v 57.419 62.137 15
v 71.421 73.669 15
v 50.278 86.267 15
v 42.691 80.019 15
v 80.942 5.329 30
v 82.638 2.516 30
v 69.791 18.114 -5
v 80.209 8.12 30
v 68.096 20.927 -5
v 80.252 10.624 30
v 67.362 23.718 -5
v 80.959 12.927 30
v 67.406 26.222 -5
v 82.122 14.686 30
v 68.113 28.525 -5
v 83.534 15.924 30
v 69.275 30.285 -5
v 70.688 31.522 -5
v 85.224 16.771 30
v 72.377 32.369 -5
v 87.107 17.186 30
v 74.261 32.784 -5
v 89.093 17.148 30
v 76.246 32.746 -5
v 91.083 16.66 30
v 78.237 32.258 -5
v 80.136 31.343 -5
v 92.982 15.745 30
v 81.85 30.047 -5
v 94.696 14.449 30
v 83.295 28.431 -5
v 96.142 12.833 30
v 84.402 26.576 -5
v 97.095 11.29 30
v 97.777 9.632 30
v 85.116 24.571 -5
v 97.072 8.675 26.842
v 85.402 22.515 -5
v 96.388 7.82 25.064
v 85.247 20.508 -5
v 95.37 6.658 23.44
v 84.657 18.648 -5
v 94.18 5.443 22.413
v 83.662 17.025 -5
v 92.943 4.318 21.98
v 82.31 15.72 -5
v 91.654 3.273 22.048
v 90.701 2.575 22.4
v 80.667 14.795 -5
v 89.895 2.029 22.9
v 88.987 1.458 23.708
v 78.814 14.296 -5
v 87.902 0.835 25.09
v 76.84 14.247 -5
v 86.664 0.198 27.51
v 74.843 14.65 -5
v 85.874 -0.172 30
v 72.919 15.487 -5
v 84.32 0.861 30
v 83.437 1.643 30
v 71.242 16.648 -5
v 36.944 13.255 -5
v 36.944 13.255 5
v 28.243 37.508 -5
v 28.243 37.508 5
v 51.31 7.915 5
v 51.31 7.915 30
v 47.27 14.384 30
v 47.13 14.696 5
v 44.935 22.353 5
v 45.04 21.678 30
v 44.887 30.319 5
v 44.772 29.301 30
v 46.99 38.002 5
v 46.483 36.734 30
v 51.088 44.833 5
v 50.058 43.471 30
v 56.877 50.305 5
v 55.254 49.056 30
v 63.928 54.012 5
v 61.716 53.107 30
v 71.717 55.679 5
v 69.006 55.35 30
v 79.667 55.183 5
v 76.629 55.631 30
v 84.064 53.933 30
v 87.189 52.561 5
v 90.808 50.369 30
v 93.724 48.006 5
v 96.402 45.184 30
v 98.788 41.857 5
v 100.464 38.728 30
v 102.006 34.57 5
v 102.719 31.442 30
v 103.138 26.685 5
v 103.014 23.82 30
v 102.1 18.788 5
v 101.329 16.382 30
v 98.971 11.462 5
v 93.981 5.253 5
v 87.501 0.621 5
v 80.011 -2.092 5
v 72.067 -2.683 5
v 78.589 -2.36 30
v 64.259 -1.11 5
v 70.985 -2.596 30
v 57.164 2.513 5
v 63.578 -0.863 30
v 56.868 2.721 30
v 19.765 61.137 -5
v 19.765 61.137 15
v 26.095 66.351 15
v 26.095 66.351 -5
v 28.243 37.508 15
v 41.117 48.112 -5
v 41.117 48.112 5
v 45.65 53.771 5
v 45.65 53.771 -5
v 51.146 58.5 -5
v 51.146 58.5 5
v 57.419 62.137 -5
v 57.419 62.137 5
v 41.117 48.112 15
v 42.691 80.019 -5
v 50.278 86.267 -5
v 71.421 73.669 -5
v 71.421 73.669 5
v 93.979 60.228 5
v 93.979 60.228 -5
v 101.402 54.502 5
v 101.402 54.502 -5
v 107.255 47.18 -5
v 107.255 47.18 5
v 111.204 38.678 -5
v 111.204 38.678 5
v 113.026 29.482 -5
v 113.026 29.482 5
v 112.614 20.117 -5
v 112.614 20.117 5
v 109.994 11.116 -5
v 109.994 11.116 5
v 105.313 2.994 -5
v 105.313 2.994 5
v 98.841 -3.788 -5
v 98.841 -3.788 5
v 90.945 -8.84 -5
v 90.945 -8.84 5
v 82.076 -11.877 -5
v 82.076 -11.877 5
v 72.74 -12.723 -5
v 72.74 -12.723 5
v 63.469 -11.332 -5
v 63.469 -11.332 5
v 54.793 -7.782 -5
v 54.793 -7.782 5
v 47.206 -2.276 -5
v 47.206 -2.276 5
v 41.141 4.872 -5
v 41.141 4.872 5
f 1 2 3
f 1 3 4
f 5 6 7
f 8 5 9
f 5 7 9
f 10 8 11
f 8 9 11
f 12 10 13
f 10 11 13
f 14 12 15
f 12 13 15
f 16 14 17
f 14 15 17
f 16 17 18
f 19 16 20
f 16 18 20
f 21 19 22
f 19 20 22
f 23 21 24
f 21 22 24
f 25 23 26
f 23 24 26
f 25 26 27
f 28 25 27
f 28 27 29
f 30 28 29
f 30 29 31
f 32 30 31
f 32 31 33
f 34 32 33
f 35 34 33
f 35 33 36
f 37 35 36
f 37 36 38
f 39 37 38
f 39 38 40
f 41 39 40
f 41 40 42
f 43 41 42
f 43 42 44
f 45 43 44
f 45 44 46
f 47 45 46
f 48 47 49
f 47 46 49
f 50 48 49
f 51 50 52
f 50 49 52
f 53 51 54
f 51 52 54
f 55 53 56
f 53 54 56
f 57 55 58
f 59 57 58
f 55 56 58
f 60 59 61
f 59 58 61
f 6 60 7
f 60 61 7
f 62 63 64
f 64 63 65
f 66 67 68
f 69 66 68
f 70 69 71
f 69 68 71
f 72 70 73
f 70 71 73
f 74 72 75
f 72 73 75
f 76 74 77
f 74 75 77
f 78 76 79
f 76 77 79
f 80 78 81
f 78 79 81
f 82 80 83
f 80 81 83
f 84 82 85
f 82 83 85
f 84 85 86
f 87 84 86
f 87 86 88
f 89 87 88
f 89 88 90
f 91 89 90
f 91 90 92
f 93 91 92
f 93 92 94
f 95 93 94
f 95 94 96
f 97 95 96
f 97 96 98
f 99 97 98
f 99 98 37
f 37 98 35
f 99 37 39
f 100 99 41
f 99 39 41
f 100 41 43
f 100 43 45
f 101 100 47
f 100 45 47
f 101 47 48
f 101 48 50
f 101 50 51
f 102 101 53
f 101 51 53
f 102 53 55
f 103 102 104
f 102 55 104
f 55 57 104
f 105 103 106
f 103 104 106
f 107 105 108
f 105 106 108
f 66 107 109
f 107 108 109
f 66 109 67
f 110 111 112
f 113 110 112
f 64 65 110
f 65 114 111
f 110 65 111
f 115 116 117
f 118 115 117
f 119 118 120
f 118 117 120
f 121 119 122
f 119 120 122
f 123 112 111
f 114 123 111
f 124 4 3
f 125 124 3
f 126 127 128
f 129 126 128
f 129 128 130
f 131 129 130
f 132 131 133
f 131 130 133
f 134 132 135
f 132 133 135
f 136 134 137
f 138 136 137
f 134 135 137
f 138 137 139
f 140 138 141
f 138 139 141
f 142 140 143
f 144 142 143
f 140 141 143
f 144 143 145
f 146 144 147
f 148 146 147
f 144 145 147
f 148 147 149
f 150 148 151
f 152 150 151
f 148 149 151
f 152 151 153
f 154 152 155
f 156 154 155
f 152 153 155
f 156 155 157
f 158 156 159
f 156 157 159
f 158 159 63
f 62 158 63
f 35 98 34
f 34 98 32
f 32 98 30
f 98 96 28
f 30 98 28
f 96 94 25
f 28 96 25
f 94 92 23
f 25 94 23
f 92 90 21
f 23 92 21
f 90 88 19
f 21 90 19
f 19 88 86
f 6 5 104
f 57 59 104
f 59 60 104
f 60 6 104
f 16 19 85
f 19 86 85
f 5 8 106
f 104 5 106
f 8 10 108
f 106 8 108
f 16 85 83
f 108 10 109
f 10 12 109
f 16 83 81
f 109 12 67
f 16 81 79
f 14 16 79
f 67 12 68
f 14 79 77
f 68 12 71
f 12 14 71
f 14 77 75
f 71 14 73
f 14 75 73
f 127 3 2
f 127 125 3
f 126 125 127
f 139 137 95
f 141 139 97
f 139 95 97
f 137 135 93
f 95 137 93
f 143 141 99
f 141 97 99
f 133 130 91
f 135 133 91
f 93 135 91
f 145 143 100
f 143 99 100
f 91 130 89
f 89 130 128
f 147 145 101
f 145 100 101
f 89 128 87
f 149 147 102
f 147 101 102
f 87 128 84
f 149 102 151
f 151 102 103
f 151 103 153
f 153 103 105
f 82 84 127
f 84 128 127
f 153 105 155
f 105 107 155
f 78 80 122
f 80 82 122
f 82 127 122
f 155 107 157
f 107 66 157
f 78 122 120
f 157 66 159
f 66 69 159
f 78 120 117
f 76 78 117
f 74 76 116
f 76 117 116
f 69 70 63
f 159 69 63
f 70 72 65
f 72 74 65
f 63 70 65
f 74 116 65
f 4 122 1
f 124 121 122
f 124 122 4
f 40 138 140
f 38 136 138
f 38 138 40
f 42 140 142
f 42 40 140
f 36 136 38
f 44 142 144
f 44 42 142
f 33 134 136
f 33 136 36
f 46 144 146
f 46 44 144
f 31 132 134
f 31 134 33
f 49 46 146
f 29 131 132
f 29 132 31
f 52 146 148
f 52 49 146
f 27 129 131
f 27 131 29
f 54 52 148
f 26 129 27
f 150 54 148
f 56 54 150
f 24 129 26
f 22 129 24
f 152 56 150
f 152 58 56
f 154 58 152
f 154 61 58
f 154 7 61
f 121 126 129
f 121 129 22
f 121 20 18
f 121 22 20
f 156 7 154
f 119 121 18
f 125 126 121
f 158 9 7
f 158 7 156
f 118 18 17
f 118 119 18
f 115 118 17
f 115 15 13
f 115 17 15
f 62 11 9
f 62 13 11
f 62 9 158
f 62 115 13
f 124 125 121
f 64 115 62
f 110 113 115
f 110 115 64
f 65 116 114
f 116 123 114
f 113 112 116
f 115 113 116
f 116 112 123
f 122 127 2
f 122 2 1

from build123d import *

# Parameters (mm, degrees)
F0_R      = 29.25
F1_DEPTH  = 25
F2_R      = 29.25
F3_DEPTH  = 10
F4_DEPTH  = 10
F9_R      = 8.5
F10_DEPTH = 152
F11_ANGLE = 180


with BuildPart() as f1:
    # F0 (on Top) → F1 (new body)
    with BuildSketch(Plane.XY):
        Circle(F0_R)
    extrude(amount=F1_DEPTH)

    # F2 (on face) → F3 (join)
    with BuildSketch(Plane.XY.offset(25)):
        with BuildLine():
            Line((28.24251, 37.508036), (11.563291, 37.508036))
            ThreePointArc((11.563291, 37.508036), (0.845642, 39.240889), (-9.936709, 37.971362))
            Line((-9.936709, 37.971362), (-28.076276, 37.971362))
            Line((-28.076276, 37.971362), (-36.944126, 13.254964))
            ThreePointArc((-36.944126, 13.254964), (0, -39.25), (36.944126, 13.254964))
            Line((36.944126, 13.254964), (28.24251, 37.508036))
        make_face()
        Circle(F2_R, mode=Mode.SUBTRACT)
        Circle(F2_R)
    extrude(amount=F3_DEPTH)

    # F2 (on face) → F4 (join, symmetric)
    with BuildSketch(Plane.XY.offset(25)):
        Polygon((11.563291, 61.137354), (11.563291, 37.508036), (28.24251, 37.508036), (19.764687, 61.137354), align=None)
        Polygon((-28.076276, 37.971362), (-9.936709, 37.971362), (-9.936709, 61.137354), (-19.764687, 61.137354), align=None)
    extrude(amount=F4_DEPTH, both=True)

    # F9 (on face) → F10 (cut)
    with BuildSketch(Plane(origin=(0, 34.499137, 59.754259), x_dir=(1, 0, 0), z_dir=(0, 0.5, 0.866025))):
        with Locations((0, -20.857124)):
            Circle(F9_R)
    extrude(amount=-F10_DEPTH, mode=Mode.SUBTRACT)


with BuildPart() as f1_1:
    # F11: moved
    add(f1.part.rotate(Axis((24.003598, 49.322695, 15), (0.337706, -0.941252, 0)), F11_ANGLE))


solid = f1_1.part
